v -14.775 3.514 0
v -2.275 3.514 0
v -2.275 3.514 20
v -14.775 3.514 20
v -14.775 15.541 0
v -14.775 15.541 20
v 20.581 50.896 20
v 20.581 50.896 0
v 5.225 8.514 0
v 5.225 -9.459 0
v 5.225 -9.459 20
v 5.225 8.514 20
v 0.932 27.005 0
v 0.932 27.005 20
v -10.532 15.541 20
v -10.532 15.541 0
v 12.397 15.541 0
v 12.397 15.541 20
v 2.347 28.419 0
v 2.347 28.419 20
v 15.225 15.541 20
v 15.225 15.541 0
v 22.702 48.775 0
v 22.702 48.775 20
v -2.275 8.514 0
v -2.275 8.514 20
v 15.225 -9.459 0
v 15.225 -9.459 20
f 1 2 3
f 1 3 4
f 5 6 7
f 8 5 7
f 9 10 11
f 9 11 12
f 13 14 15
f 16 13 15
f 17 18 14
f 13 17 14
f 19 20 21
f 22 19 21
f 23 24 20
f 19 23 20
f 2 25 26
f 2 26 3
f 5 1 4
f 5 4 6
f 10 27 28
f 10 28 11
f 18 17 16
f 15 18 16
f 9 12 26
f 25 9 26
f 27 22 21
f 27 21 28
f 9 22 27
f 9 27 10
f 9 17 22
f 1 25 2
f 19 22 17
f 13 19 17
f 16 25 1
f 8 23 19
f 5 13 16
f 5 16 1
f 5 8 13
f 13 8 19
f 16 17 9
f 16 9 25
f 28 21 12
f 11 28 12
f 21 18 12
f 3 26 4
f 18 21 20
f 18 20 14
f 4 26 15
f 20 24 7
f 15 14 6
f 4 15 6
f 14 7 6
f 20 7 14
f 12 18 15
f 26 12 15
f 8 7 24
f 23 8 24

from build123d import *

# Parameters (mm, degrees)
BOSS_EXTRUDE2_DEPTH = 20
BOSS_EXTRUDE3_DEPTH = 20


with BuildPart() as part:
    # Sketch1 → Boss-Extrude2 (new body)
    with BuildSketch(Plane.XY):
        Polygon((-2.274774775, 3.513513514), (-14.774774775, 3.513513514), (-14.774774775, 15.540540541), (5.225225225, 15.540540541), (15.225225225, 15.540540541), (15.225225225, -9.459459459), (5.225225225, -9.459459459), (5.225225225, 8.513513514), (-2.274774775, 8.513513514), align=None)
    extrude(amount=BOSS_EXTRUDE2_DEPTH)

    # Sketch2 → Boss-Extrude3 (add)
    with BuildSketch(Plane.XY.offset(20)):
        Polygon((-14.774774775, 15.540540541), (20.580564285, 50.8958796), (22.701884628, 48.774559256), (2.346545569, 28.419220197), (15.225225225, 15.540540541), (12.3967981, 15.540540541), (0.932332006, 27.005006635), (-10.532134088, 15.540540541), align=None)
    extrude(amount=-BOSS_EXTRUDE3_DEPTH)


solid = part.part
